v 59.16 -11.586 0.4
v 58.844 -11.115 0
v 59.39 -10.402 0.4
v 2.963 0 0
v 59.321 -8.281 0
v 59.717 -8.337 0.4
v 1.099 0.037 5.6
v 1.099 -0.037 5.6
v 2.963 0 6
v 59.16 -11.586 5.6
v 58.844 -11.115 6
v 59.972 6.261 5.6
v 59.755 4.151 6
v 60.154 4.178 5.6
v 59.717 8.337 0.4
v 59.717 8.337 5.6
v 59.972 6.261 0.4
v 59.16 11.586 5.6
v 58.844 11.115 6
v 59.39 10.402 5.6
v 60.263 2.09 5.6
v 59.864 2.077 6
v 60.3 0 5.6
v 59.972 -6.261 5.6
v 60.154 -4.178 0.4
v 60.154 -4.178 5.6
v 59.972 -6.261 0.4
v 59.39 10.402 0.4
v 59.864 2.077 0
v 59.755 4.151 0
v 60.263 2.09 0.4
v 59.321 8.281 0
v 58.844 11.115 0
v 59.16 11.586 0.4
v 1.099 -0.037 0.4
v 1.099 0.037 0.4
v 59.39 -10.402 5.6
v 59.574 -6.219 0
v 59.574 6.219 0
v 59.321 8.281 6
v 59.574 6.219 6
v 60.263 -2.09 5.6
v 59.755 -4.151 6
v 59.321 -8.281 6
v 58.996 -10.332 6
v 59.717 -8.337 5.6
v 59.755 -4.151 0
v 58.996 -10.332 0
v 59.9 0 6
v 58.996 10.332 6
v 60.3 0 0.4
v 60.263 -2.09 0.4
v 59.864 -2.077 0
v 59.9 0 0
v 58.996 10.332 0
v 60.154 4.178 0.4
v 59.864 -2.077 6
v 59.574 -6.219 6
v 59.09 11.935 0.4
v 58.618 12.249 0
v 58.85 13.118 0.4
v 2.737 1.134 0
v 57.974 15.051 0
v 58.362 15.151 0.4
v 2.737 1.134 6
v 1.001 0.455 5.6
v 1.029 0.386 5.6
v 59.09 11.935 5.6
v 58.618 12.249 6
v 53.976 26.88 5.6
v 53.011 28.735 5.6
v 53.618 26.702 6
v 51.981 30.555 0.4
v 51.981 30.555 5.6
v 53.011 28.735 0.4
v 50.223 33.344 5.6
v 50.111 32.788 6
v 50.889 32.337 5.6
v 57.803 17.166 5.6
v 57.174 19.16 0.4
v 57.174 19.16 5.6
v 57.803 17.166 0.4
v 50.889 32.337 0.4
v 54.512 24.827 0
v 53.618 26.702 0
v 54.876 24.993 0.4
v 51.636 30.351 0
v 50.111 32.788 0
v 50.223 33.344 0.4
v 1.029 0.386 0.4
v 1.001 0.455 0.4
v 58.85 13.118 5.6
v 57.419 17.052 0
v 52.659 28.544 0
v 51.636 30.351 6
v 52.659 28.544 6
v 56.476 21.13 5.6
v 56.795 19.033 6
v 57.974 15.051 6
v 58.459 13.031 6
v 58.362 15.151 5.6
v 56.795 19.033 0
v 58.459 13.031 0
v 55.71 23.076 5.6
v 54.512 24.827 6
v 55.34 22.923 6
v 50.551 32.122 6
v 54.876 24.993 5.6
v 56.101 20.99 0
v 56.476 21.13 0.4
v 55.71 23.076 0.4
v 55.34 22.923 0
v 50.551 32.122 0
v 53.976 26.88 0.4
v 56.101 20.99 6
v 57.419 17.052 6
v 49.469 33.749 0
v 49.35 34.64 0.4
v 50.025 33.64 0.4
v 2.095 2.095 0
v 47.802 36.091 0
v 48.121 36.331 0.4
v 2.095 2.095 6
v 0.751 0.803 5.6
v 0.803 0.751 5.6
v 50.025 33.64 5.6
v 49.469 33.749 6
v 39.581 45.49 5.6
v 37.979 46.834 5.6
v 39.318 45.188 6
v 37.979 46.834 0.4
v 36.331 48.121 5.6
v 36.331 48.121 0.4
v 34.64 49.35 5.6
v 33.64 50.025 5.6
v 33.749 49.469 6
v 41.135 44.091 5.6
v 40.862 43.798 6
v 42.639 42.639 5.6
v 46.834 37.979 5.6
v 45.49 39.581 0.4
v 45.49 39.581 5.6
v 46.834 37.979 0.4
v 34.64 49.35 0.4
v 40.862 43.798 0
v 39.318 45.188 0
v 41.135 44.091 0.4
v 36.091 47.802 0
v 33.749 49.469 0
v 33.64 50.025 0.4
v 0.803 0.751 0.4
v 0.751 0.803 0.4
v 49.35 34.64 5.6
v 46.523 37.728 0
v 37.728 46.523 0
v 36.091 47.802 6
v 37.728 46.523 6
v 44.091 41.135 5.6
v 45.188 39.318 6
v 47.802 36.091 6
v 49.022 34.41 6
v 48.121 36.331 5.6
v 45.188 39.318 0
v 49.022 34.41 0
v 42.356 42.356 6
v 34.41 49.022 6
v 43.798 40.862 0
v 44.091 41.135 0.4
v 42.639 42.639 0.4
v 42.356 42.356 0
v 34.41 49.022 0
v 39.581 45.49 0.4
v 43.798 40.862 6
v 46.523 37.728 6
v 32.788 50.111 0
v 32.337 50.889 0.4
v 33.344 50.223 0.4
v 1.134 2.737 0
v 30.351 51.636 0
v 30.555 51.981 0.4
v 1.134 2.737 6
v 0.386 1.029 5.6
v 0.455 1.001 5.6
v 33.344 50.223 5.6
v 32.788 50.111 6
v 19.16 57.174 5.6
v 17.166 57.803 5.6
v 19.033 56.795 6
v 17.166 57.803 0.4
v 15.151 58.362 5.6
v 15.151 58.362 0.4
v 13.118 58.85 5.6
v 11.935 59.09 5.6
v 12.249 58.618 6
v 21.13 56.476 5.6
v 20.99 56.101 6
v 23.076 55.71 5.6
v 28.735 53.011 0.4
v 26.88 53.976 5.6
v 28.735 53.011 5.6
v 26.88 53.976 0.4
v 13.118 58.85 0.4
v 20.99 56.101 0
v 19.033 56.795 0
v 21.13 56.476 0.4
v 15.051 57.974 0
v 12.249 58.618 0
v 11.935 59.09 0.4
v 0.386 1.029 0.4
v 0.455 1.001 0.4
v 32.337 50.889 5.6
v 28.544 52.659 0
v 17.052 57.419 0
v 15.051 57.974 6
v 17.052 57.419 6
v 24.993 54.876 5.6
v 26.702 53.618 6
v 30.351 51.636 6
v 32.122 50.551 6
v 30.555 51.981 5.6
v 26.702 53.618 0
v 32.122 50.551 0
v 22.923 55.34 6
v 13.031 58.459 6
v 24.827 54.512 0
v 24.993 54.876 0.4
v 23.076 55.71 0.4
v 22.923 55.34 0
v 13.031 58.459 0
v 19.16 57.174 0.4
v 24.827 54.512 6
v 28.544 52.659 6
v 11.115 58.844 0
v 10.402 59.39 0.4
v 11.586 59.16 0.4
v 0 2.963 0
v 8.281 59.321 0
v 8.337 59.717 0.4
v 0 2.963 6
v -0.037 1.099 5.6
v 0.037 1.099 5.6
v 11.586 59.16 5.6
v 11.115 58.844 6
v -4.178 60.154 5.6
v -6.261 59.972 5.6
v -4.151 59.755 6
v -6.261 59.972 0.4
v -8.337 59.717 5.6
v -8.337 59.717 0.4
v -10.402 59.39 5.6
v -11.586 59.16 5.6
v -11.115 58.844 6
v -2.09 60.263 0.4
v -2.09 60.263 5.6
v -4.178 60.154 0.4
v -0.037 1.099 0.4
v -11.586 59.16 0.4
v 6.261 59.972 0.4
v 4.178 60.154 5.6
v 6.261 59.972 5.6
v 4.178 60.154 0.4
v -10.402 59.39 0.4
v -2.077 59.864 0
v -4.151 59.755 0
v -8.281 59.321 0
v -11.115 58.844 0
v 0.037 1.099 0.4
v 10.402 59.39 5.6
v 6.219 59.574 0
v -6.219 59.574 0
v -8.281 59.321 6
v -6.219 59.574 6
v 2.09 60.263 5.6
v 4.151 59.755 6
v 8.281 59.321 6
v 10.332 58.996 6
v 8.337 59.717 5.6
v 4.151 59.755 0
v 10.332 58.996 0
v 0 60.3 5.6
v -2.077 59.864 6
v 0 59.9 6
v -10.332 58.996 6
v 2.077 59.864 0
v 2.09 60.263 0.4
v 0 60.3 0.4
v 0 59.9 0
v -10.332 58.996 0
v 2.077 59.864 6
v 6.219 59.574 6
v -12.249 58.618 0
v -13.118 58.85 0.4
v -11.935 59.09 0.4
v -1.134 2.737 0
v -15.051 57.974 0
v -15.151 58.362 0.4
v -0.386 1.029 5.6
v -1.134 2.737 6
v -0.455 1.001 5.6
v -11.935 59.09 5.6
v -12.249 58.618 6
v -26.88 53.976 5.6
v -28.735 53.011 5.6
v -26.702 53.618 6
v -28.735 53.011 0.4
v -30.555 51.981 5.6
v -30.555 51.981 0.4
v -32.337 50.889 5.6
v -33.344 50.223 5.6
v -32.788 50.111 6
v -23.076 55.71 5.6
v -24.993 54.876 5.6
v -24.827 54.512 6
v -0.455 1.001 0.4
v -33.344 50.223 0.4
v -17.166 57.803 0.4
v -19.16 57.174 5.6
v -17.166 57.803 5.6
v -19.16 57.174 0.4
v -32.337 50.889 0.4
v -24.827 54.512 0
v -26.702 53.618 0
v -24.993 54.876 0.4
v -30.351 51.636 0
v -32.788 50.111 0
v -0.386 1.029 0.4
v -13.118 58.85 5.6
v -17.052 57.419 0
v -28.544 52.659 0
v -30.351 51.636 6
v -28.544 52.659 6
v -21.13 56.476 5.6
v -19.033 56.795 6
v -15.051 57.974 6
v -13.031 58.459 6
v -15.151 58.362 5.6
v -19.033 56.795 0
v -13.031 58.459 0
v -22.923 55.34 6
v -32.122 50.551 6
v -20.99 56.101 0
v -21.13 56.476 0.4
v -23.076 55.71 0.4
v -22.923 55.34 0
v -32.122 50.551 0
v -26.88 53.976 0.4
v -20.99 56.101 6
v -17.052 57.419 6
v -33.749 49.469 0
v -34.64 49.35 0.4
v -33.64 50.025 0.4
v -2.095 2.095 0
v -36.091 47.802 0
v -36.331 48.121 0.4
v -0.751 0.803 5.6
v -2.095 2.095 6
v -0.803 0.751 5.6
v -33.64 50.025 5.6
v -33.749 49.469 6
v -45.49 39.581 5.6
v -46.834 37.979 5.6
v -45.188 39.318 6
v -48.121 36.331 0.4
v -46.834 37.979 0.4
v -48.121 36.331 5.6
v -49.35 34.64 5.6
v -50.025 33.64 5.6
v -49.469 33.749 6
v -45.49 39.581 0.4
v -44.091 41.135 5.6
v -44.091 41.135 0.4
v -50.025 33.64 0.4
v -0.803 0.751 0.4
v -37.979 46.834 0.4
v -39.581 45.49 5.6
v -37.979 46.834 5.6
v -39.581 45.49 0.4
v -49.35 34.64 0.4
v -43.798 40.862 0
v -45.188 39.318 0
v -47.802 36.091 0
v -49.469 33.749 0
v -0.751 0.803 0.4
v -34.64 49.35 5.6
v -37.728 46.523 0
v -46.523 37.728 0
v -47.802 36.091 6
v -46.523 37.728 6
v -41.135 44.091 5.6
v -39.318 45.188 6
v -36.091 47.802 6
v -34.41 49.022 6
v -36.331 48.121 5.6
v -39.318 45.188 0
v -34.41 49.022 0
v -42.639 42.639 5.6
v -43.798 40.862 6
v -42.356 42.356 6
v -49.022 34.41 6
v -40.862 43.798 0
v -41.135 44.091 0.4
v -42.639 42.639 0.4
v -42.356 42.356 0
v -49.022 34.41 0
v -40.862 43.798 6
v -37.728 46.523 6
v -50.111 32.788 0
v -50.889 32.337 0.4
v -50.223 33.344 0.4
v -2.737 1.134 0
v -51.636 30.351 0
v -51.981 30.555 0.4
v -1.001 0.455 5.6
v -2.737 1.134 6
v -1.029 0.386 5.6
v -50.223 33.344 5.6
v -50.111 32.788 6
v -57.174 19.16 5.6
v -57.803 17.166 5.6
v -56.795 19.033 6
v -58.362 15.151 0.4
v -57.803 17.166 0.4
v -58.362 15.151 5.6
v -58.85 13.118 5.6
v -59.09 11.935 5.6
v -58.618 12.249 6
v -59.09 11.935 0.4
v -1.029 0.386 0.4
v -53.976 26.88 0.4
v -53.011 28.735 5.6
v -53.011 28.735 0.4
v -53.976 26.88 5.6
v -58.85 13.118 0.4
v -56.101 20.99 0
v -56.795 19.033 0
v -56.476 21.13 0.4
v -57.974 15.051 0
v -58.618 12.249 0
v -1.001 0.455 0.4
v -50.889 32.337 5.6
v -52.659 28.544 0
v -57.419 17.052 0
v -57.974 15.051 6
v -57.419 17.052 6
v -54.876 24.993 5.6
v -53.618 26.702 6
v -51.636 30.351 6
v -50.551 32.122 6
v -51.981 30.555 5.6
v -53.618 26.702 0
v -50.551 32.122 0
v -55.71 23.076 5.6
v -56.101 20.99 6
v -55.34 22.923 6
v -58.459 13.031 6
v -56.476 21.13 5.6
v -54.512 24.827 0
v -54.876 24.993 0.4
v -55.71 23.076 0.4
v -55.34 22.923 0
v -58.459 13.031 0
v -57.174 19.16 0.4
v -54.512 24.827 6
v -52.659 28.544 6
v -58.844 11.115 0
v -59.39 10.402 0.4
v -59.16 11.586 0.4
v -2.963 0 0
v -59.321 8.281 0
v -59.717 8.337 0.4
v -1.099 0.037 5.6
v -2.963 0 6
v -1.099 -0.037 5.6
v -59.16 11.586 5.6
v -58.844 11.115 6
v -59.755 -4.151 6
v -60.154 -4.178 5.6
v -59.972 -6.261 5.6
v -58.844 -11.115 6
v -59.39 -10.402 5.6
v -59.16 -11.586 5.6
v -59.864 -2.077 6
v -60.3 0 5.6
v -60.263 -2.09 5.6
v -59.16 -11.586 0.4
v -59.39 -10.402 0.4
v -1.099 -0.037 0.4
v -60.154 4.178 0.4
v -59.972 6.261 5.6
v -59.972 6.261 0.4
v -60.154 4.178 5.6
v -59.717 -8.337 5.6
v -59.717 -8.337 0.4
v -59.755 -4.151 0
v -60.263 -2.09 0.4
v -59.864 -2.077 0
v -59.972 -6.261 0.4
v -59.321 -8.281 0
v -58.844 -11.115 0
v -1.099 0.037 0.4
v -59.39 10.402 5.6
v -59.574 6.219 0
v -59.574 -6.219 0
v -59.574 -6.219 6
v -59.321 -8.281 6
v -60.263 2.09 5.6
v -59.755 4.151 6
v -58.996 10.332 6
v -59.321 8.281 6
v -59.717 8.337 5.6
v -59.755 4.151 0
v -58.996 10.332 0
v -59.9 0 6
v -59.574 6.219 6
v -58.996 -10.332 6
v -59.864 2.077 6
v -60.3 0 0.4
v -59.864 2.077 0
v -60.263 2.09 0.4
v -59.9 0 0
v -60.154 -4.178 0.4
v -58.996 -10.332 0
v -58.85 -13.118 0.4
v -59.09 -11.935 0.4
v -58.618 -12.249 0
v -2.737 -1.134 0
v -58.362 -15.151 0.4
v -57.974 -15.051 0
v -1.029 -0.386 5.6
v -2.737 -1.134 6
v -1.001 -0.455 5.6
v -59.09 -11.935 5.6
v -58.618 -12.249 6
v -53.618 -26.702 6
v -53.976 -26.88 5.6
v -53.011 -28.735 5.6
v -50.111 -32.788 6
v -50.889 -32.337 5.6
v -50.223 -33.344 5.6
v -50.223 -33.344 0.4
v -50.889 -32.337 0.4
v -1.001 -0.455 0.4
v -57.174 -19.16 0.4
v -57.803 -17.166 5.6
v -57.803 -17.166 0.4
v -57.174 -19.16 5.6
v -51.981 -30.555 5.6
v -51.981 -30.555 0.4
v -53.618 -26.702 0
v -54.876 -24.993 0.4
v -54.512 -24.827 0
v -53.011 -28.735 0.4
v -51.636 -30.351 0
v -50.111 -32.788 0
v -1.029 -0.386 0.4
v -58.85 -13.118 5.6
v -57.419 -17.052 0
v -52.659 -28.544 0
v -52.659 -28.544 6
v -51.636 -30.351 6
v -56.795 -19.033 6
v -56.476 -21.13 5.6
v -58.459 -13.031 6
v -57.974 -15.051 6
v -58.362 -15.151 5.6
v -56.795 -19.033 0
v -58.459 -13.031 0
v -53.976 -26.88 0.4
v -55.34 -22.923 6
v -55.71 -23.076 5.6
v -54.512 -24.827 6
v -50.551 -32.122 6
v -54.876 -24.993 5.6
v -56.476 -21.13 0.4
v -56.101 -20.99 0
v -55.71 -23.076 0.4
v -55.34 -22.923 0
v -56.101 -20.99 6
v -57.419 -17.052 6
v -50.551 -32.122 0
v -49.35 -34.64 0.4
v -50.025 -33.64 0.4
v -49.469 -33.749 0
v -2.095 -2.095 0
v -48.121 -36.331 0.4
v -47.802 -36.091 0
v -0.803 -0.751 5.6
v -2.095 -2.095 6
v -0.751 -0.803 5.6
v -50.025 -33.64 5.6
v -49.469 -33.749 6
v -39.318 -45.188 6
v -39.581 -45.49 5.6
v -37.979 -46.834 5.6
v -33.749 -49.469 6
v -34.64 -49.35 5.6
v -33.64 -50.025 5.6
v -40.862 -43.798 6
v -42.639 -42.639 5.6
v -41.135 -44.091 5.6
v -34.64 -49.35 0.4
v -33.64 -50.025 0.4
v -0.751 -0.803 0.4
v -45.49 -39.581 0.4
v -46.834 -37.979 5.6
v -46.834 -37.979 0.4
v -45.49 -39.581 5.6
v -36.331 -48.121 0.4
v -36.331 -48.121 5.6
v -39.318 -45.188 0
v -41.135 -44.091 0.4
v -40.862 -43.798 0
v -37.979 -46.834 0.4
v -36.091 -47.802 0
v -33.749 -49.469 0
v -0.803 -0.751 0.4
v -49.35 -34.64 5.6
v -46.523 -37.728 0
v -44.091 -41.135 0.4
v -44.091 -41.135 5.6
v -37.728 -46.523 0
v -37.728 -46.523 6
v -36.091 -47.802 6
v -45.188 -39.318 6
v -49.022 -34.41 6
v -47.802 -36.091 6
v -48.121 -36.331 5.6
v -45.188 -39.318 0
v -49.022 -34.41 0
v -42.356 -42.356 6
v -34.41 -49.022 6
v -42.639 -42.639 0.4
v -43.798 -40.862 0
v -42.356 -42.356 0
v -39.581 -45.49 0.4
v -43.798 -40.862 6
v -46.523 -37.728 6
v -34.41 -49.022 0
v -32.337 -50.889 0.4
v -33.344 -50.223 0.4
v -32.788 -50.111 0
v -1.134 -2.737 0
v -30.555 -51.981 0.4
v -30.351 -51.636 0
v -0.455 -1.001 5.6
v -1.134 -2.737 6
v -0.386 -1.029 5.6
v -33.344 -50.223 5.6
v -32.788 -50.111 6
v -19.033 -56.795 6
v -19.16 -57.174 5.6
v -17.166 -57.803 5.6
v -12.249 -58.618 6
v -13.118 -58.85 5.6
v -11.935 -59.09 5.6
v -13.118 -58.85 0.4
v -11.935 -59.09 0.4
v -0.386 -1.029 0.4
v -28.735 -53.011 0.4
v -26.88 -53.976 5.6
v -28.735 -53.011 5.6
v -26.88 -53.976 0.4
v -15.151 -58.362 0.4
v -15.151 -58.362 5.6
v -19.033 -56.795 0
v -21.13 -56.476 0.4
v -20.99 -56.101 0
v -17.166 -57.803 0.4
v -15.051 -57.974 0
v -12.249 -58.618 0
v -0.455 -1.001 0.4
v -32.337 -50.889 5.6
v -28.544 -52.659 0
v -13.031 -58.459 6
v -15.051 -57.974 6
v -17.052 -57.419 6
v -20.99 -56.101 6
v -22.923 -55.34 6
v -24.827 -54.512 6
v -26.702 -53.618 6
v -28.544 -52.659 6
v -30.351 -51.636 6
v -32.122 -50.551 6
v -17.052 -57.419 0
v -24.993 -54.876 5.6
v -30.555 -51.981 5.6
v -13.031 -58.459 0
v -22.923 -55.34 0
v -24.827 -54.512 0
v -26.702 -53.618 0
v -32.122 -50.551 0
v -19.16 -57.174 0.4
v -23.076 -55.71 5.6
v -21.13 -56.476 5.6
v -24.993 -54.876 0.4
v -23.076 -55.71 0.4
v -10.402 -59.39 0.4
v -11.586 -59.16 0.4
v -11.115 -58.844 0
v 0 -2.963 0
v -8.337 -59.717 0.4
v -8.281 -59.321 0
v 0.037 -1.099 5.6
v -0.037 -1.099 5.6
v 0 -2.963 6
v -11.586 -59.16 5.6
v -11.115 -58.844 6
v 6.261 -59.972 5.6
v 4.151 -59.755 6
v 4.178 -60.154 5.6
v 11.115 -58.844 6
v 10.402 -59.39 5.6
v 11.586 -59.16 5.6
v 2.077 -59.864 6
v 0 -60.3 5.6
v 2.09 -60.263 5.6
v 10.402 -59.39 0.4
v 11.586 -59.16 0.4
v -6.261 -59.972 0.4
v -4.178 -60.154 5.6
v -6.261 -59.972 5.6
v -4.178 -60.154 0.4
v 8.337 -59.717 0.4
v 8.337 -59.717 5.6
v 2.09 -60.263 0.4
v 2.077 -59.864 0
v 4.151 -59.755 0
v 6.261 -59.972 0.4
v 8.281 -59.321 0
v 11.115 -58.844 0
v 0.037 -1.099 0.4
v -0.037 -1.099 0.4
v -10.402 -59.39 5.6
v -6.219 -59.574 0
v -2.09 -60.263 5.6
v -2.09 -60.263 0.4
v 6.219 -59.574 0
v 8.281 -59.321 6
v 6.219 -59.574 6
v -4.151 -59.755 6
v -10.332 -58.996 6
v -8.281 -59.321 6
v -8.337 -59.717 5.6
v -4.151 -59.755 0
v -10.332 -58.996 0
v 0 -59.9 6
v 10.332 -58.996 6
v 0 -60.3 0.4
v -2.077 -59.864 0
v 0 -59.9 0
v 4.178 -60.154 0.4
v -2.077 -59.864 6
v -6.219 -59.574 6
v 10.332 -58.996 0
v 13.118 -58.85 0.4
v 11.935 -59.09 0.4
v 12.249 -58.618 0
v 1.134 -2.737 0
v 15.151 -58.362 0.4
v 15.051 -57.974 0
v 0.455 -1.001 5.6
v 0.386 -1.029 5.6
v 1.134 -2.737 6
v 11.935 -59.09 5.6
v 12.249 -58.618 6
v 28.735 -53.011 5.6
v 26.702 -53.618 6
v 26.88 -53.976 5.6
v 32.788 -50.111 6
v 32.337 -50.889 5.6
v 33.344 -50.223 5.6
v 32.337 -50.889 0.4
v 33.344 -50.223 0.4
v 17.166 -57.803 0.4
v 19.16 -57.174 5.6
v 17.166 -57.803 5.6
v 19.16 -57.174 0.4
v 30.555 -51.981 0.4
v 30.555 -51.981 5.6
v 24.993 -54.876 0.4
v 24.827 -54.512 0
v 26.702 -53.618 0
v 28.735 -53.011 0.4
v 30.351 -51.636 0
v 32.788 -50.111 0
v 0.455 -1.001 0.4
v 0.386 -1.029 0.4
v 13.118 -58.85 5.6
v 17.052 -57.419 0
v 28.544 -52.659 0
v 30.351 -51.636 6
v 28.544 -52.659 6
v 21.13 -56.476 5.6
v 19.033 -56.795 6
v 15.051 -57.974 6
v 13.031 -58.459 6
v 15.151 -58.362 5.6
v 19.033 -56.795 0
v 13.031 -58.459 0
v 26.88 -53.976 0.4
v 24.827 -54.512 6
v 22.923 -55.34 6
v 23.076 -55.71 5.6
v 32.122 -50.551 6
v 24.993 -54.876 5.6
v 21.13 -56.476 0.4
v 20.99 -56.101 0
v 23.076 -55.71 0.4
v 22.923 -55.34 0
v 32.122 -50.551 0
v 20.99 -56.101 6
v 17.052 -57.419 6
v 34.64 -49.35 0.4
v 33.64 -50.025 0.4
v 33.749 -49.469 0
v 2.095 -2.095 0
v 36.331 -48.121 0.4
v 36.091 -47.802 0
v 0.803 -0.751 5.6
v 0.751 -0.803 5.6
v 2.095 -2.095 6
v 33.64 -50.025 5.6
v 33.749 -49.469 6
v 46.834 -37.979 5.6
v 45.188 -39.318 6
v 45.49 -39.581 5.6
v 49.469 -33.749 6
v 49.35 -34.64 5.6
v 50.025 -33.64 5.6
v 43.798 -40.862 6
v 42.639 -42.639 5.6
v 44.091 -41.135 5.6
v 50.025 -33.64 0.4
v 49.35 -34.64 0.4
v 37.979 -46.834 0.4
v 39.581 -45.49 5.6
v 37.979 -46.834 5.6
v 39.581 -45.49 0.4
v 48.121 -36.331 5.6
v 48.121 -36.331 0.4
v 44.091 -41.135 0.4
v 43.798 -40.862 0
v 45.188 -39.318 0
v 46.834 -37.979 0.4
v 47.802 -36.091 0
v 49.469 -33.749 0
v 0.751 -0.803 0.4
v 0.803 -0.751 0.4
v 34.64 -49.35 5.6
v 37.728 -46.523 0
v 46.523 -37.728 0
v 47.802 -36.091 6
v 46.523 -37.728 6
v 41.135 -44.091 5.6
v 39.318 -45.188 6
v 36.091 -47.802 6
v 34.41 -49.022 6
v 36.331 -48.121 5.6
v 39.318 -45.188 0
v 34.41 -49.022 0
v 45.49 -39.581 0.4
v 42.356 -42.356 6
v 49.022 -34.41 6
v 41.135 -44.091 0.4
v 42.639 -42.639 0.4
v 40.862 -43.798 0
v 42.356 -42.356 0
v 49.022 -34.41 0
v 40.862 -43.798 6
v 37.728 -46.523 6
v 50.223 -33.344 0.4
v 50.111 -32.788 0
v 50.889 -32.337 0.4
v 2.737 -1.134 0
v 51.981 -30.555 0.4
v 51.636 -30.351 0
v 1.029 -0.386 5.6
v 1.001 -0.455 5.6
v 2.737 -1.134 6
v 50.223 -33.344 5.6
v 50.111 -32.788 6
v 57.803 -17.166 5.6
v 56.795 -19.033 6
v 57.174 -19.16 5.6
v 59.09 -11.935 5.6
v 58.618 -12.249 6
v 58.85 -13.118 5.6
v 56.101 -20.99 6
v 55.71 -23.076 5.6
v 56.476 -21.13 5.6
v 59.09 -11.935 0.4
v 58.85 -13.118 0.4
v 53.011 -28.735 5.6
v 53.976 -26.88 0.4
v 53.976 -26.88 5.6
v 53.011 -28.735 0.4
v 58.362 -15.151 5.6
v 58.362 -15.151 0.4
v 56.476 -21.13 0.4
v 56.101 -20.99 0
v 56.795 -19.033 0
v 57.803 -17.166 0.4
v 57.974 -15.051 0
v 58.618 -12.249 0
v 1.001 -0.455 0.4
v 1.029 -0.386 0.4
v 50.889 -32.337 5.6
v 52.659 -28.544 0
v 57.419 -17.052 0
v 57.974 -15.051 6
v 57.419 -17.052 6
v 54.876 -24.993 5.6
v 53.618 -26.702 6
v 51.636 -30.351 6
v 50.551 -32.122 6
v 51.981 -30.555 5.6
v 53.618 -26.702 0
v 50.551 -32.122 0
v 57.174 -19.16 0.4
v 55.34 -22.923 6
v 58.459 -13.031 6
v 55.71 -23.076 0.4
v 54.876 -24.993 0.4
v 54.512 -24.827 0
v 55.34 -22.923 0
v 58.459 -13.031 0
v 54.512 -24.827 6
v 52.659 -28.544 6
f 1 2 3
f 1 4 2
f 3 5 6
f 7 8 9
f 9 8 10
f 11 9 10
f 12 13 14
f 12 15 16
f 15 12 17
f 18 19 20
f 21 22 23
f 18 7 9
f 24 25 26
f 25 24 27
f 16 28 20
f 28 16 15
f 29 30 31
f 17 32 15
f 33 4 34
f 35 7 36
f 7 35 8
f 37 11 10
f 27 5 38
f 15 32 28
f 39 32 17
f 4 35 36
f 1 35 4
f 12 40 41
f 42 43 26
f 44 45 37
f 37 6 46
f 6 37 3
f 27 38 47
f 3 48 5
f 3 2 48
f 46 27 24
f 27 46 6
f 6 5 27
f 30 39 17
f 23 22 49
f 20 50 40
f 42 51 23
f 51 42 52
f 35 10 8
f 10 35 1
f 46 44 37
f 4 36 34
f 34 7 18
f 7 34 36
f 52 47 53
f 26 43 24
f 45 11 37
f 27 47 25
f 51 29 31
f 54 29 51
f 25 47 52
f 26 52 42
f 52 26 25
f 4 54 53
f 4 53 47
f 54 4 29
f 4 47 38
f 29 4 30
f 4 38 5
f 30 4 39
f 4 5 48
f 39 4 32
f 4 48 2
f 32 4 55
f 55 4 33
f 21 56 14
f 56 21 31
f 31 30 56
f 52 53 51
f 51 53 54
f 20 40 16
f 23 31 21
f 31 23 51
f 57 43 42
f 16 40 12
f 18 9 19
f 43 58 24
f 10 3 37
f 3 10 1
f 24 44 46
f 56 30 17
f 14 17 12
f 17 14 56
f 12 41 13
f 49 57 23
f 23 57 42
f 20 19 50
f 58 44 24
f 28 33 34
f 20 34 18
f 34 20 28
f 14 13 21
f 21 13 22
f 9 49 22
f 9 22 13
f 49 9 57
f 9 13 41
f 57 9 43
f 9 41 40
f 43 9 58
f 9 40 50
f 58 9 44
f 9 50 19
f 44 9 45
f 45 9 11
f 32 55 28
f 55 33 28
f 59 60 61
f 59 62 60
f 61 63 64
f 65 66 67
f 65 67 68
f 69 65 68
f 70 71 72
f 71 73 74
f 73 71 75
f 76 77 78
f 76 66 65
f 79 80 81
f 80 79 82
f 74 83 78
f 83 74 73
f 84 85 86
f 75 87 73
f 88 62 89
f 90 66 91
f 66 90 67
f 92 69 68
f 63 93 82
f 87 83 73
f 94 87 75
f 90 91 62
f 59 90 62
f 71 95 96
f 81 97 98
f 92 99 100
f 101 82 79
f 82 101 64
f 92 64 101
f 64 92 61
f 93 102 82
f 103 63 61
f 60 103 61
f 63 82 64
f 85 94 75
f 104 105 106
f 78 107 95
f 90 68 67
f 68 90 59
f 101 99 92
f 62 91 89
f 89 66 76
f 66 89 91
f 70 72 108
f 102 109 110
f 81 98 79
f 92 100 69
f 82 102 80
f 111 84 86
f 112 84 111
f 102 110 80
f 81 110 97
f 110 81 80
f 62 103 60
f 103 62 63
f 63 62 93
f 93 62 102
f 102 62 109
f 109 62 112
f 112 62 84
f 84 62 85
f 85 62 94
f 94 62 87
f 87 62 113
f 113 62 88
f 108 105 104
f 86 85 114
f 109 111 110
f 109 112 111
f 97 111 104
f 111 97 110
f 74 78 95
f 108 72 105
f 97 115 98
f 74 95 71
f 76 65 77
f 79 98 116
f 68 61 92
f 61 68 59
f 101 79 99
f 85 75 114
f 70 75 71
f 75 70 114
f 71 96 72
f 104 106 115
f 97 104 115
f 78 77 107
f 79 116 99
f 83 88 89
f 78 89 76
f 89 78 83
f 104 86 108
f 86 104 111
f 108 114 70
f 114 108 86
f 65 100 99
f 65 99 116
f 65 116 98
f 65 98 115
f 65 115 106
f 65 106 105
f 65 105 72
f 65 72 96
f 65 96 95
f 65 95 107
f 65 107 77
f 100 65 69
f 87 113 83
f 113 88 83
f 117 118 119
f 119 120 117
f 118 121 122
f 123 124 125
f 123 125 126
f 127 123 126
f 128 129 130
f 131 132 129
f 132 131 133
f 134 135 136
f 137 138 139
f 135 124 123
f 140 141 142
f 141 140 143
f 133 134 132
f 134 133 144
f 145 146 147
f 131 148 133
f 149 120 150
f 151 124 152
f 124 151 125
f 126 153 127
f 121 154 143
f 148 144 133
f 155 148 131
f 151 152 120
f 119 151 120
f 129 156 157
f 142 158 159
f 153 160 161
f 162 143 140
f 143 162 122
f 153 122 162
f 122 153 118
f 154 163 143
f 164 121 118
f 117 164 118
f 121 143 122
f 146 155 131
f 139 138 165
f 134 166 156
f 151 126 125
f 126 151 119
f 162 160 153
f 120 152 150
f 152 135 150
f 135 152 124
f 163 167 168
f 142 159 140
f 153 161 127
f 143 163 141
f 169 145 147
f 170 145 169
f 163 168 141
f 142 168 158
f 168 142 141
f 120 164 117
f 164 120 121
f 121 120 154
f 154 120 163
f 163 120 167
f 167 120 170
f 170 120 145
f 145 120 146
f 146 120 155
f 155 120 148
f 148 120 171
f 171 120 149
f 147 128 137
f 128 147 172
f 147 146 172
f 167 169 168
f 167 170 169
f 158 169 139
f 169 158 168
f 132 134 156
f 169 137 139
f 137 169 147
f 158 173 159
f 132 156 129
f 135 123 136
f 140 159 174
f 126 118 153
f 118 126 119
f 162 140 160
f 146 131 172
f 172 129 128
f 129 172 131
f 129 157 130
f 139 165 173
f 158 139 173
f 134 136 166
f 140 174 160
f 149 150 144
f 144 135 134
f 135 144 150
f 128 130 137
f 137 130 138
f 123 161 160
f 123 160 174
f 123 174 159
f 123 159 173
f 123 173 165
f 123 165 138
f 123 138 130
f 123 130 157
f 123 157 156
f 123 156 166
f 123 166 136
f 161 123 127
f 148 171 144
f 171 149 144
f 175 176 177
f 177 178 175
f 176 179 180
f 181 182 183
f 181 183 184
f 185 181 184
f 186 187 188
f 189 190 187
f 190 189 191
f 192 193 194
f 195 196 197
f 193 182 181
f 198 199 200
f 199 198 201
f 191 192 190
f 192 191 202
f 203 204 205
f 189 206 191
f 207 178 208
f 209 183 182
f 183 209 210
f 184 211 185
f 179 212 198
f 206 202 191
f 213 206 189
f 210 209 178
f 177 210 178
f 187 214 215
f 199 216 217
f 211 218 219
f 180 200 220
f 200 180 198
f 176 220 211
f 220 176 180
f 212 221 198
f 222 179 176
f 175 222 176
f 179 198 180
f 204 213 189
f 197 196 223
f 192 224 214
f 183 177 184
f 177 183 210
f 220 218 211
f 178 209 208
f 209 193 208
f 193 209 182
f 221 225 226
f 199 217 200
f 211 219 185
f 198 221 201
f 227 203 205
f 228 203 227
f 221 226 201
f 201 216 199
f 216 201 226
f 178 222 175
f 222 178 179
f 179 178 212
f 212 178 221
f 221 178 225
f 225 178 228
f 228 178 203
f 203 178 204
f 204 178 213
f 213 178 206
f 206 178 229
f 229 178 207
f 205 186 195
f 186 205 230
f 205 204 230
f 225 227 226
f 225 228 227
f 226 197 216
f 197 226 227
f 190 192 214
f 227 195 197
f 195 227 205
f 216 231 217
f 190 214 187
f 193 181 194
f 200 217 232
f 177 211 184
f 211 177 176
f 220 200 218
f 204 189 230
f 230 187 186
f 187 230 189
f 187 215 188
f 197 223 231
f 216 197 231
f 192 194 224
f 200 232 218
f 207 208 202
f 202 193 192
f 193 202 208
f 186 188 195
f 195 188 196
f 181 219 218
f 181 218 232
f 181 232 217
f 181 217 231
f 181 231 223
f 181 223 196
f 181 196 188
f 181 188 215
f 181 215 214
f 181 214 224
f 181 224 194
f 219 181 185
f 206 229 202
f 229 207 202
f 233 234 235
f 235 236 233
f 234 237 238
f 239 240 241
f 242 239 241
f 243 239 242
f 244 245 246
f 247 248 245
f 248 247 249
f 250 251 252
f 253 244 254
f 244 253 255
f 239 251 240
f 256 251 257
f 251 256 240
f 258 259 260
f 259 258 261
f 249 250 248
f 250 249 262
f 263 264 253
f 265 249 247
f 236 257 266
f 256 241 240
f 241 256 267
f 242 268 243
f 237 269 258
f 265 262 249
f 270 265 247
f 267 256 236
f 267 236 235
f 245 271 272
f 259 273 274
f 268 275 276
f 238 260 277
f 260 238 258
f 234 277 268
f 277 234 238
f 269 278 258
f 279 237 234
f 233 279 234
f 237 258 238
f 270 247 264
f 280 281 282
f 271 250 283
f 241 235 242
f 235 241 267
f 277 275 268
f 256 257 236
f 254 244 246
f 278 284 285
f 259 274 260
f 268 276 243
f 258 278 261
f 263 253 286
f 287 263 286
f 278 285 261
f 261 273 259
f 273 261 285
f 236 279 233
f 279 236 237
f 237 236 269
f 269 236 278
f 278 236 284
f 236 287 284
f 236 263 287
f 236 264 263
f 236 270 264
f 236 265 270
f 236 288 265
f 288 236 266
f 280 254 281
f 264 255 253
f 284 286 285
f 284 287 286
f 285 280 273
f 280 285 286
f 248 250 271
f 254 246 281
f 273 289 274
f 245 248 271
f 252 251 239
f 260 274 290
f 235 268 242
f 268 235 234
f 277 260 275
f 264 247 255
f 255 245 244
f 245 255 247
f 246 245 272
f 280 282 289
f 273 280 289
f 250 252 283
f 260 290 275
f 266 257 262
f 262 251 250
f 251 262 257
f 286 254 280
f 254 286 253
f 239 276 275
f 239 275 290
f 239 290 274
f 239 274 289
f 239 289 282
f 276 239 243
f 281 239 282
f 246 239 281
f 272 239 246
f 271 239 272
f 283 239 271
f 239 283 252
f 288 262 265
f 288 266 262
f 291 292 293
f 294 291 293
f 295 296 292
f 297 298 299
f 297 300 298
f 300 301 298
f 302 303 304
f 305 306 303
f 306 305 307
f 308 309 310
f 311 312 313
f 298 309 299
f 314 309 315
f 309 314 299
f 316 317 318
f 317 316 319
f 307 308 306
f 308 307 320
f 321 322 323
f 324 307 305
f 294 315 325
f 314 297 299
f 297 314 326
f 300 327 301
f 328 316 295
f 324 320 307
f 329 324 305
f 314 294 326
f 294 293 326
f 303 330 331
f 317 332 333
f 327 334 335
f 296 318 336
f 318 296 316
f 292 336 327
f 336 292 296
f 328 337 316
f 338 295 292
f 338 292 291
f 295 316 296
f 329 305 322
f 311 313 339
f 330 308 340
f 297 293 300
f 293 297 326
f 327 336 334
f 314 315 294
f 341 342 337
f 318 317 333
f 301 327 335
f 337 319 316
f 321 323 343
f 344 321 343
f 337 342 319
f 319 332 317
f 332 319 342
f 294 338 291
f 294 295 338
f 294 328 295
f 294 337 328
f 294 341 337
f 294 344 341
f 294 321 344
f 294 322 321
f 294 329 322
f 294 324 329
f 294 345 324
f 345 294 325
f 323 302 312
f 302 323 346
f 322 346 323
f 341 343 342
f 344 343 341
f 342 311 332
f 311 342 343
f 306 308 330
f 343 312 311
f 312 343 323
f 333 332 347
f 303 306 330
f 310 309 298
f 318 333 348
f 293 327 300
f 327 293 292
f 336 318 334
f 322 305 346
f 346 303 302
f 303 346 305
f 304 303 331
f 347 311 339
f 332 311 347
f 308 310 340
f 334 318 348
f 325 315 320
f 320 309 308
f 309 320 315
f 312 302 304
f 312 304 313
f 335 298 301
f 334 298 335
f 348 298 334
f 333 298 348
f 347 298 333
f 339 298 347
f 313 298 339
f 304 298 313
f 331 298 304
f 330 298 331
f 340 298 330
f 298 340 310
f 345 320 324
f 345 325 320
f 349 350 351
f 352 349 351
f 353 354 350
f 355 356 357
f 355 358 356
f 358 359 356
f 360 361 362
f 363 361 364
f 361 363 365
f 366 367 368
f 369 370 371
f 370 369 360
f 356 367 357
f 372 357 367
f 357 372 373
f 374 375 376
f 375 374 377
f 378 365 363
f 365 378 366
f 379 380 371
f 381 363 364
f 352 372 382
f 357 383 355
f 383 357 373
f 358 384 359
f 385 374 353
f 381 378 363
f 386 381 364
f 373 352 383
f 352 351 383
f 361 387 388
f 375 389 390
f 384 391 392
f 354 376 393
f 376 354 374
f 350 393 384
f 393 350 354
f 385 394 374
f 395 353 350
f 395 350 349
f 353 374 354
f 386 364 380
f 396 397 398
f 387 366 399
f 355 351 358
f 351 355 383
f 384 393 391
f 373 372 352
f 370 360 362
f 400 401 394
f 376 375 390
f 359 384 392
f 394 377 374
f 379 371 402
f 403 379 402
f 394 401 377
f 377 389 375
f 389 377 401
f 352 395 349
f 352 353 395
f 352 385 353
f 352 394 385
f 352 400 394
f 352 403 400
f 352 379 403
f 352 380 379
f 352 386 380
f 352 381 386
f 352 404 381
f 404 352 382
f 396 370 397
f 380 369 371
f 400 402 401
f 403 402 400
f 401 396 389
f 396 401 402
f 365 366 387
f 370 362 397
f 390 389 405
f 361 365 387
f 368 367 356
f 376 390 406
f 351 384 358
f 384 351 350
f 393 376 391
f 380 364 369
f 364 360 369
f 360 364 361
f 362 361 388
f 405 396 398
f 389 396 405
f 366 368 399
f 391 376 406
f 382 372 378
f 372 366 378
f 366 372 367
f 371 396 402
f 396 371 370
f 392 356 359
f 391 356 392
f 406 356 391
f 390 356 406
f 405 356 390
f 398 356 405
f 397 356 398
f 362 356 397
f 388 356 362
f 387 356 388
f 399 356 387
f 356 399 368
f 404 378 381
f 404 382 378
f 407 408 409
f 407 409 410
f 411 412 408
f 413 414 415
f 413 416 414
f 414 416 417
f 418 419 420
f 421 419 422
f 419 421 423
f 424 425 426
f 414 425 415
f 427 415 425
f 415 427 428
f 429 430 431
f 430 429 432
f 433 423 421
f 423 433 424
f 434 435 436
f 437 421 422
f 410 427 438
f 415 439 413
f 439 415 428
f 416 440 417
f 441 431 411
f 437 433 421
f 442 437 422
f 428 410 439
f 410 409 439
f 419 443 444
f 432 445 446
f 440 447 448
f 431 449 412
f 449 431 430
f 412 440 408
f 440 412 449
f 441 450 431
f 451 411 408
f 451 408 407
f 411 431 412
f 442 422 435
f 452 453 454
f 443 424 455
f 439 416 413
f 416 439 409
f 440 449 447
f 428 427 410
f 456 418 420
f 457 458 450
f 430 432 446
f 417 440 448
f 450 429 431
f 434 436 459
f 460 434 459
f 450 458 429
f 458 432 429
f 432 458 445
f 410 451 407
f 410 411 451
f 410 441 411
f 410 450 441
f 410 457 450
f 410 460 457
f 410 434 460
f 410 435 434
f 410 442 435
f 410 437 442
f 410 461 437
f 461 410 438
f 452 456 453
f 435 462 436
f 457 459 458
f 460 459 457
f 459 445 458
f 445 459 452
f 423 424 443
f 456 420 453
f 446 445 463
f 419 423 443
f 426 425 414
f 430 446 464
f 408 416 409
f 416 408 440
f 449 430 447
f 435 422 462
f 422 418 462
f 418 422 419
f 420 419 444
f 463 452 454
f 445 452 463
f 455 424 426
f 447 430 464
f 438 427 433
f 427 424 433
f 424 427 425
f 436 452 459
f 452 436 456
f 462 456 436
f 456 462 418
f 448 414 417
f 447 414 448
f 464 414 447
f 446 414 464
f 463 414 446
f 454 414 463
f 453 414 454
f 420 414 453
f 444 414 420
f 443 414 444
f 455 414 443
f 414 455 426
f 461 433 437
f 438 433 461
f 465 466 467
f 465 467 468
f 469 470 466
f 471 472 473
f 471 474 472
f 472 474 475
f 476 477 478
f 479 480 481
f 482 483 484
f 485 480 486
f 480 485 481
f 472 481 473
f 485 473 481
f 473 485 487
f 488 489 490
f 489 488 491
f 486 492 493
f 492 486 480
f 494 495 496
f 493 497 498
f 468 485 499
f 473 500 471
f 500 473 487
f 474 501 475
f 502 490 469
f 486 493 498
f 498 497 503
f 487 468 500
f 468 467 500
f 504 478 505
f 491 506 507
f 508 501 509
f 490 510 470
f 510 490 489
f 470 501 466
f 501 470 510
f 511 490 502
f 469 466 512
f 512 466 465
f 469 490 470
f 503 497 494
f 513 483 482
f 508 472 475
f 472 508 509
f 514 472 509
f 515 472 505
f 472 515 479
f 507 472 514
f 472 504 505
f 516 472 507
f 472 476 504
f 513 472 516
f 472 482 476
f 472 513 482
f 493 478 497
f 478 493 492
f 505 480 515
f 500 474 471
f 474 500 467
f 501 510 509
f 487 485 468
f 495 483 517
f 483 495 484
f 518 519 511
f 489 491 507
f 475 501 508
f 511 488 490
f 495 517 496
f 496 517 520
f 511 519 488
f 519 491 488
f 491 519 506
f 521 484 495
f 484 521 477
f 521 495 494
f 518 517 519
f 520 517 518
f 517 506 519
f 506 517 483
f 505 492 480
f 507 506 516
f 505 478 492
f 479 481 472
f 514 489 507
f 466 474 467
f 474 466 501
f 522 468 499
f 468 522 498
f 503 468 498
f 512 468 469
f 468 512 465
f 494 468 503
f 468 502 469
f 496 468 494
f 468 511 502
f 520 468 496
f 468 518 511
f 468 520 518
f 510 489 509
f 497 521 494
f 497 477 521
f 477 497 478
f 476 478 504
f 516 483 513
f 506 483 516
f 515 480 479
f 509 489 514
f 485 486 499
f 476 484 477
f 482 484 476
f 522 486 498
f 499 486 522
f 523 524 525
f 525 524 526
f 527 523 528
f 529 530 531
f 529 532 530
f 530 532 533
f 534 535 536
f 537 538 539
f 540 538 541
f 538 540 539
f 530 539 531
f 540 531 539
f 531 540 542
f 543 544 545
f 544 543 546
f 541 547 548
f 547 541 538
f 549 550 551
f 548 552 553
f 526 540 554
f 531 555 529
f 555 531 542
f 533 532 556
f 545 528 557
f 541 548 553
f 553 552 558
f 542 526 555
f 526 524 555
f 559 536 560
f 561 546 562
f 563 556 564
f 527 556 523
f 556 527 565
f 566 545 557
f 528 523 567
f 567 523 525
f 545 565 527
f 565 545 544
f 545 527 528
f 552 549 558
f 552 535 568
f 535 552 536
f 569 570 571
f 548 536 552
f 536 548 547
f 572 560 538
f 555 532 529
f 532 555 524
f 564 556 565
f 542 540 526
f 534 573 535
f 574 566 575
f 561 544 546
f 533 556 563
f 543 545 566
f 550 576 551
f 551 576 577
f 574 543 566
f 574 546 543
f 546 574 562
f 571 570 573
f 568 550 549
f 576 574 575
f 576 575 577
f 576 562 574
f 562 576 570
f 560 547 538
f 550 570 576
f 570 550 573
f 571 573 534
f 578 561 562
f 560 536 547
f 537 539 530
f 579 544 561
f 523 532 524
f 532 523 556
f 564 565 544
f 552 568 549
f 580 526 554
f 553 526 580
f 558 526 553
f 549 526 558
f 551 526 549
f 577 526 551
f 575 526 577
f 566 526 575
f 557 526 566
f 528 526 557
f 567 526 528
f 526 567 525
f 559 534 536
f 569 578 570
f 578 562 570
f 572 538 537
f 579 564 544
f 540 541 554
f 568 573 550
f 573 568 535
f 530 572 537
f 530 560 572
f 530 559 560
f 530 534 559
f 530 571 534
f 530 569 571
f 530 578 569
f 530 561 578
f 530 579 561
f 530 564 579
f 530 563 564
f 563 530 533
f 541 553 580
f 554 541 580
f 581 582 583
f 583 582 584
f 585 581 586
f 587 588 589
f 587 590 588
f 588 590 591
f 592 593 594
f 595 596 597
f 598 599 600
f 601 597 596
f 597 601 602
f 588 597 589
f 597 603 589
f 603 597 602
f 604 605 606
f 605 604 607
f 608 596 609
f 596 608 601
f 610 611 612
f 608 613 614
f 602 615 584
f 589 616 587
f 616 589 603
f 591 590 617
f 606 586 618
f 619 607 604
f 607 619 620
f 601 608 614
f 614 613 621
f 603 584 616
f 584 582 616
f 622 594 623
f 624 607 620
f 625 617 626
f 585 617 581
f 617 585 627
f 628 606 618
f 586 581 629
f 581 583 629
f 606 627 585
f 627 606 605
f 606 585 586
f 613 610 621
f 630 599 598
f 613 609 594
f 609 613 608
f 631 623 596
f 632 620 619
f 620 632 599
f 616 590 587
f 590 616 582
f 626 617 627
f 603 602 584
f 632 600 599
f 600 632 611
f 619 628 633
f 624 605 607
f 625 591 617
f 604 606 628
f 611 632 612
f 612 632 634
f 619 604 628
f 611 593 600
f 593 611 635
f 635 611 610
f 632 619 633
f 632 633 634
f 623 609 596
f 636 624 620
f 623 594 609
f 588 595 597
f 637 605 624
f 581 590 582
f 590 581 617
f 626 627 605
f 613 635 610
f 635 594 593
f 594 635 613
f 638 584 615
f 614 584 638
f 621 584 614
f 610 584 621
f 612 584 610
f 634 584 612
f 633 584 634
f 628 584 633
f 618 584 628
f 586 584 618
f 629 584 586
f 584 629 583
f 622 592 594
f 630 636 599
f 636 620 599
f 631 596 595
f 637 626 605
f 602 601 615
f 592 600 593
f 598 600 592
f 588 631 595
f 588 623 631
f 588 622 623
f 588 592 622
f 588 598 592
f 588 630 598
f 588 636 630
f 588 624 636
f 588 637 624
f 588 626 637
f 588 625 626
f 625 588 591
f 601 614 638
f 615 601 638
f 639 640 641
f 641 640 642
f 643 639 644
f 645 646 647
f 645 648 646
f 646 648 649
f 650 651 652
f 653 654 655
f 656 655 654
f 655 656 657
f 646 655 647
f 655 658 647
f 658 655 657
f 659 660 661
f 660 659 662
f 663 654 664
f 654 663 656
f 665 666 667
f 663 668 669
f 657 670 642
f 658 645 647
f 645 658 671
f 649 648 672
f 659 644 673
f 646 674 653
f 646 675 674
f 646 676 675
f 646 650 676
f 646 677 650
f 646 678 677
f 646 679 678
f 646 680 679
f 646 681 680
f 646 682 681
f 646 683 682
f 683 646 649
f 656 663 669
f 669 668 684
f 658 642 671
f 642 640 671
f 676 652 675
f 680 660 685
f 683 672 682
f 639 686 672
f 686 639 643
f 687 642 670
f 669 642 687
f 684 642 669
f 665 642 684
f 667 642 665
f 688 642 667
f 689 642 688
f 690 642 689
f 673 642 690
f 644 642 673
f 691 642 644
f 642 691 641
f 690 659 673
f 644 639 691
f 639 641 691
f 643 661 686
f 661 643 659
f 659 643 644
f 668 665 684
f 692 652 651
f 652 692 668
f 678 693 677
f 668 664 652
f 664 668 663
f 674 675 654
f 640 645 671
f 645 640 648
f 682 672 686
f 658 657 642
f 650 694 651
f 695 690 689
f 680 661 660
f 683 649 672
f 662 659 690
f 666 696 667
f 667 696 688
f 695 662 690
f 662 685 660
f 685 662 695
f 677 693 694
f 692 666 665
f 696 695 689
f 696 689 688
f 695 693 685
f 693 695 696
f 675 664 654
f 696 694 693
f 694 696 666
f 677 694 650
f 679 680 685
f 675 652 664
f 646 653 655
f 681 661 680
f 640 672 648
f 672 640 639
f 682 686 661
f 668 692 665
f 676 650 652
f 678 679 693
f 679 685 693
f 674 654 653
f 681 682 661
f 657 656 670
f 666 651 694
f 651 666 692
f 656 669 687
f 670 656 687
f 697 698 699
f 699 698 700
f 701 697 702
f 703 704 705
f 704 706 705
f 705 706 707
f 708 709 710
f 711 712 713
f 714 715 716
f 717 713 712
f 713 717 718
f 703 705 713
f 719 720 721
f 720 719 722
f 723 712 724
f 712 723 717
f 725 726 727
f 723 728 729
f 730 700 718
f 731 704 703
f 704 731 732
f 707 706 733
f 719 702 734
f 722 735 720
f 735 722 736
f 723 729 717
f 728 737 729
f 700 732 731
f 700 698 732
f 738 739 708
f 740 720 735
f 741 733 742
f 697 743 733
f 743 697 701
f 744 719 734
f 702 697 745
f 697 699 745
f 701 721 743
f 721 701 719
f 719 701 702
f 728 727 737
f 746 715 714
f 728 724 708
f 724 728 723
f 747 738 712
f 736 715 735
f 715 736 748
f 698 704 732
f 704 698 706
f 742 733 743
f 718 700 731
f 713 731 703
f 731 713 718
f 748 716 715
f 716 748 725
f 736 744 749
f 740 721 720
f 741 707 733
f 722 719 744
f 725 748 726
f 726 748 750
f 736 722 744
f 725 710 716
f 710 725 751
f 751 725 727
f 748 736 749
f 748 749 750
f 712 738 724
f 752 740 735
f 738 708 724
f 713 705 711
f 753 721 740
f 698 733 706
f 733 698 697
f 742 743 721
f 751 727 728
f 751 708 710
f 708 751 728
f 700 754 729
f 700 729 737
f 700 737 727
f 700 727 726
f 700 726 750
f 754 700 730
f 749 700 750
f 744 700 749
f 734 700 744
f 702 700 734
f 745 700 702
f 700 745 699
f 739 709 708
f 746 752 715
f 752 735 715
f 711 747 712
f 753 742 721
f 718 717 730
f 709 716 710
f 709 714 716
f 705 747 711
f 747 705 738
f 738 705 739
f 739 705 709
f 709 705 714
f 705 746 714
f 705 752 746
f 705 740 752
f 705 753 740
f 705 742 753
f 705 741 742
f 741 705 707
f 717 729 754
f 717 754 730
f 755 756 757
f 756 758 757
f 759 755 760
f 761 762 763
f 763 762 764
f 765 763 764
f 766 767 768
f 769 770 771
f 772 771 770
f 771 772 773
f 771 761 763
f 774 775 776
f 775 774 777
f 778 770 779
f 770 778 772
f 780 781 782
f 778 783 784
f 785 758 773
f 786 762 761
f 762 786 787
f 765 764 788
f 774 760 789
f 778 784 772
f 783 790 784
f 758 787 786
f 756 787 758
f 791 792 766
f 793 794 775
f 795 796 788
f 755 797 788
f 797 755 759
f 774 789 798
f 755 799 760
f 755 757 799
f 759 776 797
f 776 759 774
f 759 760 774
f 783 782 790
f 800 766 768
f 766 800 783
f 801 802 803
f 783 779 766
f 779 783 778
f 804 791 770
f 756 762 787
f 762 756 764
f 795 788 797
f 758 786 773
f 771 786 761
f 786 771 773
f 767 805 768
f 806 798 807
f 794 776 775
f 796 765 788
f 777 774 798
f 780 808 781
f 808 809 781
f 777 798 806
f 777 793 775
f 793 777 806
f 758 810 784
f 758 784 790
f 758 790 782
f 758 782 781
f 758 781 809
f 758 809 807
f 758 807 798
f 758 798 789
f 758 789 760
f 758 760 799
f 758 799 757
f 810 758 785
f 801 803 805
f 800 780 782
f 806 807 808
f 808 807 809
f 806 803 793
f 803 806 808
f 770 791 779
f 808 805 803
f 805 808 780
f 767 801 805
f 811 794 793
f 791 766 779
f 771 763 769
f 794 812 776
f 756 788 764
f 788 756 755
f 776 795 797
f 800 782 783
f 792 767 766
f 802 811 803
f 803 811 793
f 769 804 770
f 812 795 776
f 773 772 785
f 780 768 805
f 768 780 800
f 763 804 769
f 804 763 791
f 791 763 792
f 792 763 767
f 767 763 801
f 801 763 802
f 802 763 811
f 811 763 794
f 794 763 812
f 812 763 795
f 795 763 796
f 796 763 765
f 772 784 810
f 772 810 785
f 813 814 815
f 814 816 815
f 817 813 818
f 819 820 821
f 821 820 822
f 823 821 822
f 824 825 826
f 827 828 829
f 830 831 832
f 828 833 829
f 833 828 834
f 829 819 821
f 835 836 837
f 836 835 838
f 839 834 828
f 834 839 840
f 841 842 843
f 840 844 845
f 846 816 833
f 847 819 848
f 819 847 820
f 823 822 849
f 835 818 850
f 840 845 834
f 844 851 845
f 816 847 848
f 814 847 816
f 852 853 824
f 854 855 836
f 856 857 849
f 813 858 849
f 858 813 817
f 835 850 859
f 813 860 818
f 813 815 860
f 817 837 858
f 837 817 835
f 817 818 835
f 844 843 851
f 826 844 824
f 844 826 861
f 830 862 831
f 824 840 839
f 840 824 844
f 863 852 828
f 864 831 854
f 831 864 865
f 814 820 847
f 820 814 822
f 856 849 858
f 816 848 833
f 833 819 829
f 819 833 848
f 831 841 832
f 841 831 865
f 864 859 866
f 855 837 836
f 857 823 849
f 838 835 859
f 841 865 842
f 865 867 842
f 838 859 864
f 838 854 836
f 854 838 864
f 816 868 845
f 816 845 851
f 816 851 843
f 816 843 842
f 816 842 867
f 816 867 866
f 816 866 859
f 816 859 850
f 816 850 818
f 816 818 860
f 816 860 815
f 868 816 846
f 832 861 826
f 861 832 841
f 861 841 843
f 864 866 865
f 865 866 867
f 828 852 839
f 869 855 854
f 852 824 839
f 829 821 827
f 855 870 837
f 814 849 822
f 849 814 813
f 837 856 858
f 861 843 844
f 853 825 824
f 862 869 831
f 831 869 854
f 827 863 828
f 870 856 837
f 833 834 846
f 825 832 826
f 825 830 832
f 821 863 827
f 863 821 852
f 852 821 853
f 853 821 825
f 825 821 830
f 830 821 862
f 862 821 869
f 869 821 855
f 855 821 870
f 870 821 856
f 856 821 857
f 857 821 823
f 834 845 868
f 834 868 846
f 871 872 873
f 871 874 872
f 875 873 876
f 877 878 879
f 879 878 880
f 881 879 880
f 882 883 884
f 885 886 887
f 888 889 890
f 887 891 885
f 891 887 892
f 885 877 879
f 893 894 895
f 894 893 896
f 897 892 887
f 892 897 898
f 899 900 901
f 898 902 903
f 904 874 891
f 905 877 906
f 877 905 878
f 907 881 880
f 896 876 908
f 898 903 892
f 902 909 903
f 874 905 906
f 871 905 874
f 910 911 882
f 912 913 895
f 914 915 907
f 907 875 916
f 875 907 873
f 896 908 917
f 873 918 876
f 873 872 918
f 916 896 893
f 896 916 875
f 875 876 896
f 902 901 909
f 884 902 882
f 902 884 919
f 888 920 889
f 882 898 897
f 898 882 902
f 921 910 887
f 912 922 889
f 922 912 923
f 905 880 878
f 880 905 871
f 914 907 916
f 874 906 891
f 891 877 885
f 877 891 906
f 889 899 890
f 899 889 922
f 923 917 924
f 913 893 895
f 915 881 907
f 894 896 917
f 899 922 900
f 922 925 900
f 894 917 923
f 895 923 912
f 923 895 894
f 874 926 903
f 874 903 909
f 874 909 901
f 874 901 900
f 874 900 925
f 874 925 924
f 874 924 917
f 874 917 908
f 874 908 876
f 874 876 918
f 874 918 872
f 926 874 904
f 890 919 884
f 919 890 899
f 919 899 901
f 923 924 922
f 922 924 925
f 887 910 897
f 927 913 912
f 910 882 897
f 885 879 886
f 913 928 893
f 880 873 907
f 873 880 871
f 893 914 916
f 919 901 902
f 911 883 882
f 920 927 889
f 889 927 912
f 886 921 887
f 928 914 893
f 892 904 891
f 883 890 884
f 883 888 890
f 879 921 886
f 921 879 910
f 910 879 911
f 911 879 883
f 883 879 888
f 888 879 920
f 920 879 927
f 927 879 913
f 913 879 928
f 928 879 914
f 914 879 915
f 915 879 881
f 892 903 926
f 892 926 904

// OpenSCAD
// ============================================================================
// Parametric 16-Sector Circle Model (16等分扇形圆模型 / 圆面积推导教具)
// Specifications:
//   - Circle Diameter: 120.0 mm (Radius = 60.0 mm)
//   - Thickness: 6.0 mm
//   - Number of Sectors: 16 (22.5° per sector)
//   - Print Clearance & Center Tip Relief for 16-piece physical assembly
// ============================================================================

$fn = 180;

/* [Dimensions / 基本尺寸] */
// 圆整体直径 (mm)
circle_diameter = 120.0;
// 扇形厚度 (mm)
thickness = 6.0;
// 等分数量
num_sectors = 16;

/* [Manufacturing & Print Tolerance / 打印公差与倒角] */
// 相邻扇形侧面单边装配间隙 (mm)，确保16块拼合不卡死
side_clearance = 0.10;
// 圆心尖端避空半径 (mm)，消除0.4mm喷嘴在22.5°尖角处的堆料干涉
center_relief_r = 0.60;
// 上下底面微倒角高度 (mm)，消除首层象脚并提升手感
edge_chamfer = 0.40;

/* [Render Mode / 输出模式] */
// 0 = 16等分圆盘拼合状态 (带径向微间距), 1 = 单个扇形块, 2 = 打印盘排版(径向展开2.5mm防粘连), 3 = 圆面积公式推导平行四边形排列
render_mode = 0; // [0, 1, 2, 3]
// 盘面展示/打印时的径向展开间距 (mm)
radial_explode = (render_mode == 2) ? 3.0 : 0.4;

radius = circle_diameter / 2.0;
sector_angle = 360.0 / num_sectors; // 22.5 deg

// 2D profile of a single sector with side clearance and center tip relief
module sector_2d(r, angle, clr, tip_r, delta_r = 0) {
    eff_r = r + delta_r;
    offset(r = -clr + delta_r) {
        difference() {
            intersection() {
                circle(r = r);
                polygon(points = [
                    [0, 0],
                    [r * 2 * cos(-angle / 2), r * 2 * sin(-angle / 2)],
                    [r * 2, 0],
                    [r * 2 * cos(angle / 2),  r * 2 * sin(angle / 2)]
                ]);
            }
            if (tip_r > 0) {
                circle(r = tip_r);
            }
        }
    }
}

// 3D single sector with top & bottom chamfers
module sector_3d() {
    hull() {
        // Bottom chamfer face
        linear_extrude(height = 0.01)
            sector_2d(radius, sector_angle, side_clearance, center_relief_r, -edge_chamfer);
        // Main body
        translate([0, 0, edge_chamfer])
            linear_extrude(height = thickness - 2 * edge_chamfer)
                sector_2d(radius, sector_angle, side_clearance, center_relief_r, 0);
        // Top chamfer face
        translate([0, 0, thickness - 0.01])
            linear_extrude(height = 0.01)
                sector_2d(radius, sector_angle, side_clearance, center_relief_r, -edge_chamfer);
    }
}

// Mode 0 & Mode 2: 16 sectors arranged in a circle
module circle_16_sectors(explode_dist = 0.4) {
    for (i = [0 : num_sectors - 1]) {
        ang = i * sector_angle;
        rotate([0, 0, ang])
            translate([explode_dist, 0, 0])
                color((i % 2 == 0) ? "#38bdf8" : "#f59e0b")
                    sector_3d();
    }
}

// Mode 3: Parallelogram arrangement (8 bottom + 8 top interleaved)
module parallelogram_16_sectors() {
    arc_step = 2 * radius * sin(sector_angle / 2);
    for (i = [0 : (num_sectors / 2) - 1]) {
        // Bottom row pointing up
        translate([i * arc_step, 0, 0])
            rotate([0, 0, 90])
                color("#38bdf8")
                    sector_3d();
        // Top row pointing down, interleaved
        translate([(i + 0.5) * arc_step, radius * cos(sector_angle / 2), 0])
            rotate([0, 0, -90])
                color("#f59e0b")
                    sector_3d();
    }
}

if (render_mode == 1) {
    sector_3d();
} else if (render_mode == 3) {
    parallelogram_16_sectors();
} else {
    circle_16_sectors(radial_explode);
}
